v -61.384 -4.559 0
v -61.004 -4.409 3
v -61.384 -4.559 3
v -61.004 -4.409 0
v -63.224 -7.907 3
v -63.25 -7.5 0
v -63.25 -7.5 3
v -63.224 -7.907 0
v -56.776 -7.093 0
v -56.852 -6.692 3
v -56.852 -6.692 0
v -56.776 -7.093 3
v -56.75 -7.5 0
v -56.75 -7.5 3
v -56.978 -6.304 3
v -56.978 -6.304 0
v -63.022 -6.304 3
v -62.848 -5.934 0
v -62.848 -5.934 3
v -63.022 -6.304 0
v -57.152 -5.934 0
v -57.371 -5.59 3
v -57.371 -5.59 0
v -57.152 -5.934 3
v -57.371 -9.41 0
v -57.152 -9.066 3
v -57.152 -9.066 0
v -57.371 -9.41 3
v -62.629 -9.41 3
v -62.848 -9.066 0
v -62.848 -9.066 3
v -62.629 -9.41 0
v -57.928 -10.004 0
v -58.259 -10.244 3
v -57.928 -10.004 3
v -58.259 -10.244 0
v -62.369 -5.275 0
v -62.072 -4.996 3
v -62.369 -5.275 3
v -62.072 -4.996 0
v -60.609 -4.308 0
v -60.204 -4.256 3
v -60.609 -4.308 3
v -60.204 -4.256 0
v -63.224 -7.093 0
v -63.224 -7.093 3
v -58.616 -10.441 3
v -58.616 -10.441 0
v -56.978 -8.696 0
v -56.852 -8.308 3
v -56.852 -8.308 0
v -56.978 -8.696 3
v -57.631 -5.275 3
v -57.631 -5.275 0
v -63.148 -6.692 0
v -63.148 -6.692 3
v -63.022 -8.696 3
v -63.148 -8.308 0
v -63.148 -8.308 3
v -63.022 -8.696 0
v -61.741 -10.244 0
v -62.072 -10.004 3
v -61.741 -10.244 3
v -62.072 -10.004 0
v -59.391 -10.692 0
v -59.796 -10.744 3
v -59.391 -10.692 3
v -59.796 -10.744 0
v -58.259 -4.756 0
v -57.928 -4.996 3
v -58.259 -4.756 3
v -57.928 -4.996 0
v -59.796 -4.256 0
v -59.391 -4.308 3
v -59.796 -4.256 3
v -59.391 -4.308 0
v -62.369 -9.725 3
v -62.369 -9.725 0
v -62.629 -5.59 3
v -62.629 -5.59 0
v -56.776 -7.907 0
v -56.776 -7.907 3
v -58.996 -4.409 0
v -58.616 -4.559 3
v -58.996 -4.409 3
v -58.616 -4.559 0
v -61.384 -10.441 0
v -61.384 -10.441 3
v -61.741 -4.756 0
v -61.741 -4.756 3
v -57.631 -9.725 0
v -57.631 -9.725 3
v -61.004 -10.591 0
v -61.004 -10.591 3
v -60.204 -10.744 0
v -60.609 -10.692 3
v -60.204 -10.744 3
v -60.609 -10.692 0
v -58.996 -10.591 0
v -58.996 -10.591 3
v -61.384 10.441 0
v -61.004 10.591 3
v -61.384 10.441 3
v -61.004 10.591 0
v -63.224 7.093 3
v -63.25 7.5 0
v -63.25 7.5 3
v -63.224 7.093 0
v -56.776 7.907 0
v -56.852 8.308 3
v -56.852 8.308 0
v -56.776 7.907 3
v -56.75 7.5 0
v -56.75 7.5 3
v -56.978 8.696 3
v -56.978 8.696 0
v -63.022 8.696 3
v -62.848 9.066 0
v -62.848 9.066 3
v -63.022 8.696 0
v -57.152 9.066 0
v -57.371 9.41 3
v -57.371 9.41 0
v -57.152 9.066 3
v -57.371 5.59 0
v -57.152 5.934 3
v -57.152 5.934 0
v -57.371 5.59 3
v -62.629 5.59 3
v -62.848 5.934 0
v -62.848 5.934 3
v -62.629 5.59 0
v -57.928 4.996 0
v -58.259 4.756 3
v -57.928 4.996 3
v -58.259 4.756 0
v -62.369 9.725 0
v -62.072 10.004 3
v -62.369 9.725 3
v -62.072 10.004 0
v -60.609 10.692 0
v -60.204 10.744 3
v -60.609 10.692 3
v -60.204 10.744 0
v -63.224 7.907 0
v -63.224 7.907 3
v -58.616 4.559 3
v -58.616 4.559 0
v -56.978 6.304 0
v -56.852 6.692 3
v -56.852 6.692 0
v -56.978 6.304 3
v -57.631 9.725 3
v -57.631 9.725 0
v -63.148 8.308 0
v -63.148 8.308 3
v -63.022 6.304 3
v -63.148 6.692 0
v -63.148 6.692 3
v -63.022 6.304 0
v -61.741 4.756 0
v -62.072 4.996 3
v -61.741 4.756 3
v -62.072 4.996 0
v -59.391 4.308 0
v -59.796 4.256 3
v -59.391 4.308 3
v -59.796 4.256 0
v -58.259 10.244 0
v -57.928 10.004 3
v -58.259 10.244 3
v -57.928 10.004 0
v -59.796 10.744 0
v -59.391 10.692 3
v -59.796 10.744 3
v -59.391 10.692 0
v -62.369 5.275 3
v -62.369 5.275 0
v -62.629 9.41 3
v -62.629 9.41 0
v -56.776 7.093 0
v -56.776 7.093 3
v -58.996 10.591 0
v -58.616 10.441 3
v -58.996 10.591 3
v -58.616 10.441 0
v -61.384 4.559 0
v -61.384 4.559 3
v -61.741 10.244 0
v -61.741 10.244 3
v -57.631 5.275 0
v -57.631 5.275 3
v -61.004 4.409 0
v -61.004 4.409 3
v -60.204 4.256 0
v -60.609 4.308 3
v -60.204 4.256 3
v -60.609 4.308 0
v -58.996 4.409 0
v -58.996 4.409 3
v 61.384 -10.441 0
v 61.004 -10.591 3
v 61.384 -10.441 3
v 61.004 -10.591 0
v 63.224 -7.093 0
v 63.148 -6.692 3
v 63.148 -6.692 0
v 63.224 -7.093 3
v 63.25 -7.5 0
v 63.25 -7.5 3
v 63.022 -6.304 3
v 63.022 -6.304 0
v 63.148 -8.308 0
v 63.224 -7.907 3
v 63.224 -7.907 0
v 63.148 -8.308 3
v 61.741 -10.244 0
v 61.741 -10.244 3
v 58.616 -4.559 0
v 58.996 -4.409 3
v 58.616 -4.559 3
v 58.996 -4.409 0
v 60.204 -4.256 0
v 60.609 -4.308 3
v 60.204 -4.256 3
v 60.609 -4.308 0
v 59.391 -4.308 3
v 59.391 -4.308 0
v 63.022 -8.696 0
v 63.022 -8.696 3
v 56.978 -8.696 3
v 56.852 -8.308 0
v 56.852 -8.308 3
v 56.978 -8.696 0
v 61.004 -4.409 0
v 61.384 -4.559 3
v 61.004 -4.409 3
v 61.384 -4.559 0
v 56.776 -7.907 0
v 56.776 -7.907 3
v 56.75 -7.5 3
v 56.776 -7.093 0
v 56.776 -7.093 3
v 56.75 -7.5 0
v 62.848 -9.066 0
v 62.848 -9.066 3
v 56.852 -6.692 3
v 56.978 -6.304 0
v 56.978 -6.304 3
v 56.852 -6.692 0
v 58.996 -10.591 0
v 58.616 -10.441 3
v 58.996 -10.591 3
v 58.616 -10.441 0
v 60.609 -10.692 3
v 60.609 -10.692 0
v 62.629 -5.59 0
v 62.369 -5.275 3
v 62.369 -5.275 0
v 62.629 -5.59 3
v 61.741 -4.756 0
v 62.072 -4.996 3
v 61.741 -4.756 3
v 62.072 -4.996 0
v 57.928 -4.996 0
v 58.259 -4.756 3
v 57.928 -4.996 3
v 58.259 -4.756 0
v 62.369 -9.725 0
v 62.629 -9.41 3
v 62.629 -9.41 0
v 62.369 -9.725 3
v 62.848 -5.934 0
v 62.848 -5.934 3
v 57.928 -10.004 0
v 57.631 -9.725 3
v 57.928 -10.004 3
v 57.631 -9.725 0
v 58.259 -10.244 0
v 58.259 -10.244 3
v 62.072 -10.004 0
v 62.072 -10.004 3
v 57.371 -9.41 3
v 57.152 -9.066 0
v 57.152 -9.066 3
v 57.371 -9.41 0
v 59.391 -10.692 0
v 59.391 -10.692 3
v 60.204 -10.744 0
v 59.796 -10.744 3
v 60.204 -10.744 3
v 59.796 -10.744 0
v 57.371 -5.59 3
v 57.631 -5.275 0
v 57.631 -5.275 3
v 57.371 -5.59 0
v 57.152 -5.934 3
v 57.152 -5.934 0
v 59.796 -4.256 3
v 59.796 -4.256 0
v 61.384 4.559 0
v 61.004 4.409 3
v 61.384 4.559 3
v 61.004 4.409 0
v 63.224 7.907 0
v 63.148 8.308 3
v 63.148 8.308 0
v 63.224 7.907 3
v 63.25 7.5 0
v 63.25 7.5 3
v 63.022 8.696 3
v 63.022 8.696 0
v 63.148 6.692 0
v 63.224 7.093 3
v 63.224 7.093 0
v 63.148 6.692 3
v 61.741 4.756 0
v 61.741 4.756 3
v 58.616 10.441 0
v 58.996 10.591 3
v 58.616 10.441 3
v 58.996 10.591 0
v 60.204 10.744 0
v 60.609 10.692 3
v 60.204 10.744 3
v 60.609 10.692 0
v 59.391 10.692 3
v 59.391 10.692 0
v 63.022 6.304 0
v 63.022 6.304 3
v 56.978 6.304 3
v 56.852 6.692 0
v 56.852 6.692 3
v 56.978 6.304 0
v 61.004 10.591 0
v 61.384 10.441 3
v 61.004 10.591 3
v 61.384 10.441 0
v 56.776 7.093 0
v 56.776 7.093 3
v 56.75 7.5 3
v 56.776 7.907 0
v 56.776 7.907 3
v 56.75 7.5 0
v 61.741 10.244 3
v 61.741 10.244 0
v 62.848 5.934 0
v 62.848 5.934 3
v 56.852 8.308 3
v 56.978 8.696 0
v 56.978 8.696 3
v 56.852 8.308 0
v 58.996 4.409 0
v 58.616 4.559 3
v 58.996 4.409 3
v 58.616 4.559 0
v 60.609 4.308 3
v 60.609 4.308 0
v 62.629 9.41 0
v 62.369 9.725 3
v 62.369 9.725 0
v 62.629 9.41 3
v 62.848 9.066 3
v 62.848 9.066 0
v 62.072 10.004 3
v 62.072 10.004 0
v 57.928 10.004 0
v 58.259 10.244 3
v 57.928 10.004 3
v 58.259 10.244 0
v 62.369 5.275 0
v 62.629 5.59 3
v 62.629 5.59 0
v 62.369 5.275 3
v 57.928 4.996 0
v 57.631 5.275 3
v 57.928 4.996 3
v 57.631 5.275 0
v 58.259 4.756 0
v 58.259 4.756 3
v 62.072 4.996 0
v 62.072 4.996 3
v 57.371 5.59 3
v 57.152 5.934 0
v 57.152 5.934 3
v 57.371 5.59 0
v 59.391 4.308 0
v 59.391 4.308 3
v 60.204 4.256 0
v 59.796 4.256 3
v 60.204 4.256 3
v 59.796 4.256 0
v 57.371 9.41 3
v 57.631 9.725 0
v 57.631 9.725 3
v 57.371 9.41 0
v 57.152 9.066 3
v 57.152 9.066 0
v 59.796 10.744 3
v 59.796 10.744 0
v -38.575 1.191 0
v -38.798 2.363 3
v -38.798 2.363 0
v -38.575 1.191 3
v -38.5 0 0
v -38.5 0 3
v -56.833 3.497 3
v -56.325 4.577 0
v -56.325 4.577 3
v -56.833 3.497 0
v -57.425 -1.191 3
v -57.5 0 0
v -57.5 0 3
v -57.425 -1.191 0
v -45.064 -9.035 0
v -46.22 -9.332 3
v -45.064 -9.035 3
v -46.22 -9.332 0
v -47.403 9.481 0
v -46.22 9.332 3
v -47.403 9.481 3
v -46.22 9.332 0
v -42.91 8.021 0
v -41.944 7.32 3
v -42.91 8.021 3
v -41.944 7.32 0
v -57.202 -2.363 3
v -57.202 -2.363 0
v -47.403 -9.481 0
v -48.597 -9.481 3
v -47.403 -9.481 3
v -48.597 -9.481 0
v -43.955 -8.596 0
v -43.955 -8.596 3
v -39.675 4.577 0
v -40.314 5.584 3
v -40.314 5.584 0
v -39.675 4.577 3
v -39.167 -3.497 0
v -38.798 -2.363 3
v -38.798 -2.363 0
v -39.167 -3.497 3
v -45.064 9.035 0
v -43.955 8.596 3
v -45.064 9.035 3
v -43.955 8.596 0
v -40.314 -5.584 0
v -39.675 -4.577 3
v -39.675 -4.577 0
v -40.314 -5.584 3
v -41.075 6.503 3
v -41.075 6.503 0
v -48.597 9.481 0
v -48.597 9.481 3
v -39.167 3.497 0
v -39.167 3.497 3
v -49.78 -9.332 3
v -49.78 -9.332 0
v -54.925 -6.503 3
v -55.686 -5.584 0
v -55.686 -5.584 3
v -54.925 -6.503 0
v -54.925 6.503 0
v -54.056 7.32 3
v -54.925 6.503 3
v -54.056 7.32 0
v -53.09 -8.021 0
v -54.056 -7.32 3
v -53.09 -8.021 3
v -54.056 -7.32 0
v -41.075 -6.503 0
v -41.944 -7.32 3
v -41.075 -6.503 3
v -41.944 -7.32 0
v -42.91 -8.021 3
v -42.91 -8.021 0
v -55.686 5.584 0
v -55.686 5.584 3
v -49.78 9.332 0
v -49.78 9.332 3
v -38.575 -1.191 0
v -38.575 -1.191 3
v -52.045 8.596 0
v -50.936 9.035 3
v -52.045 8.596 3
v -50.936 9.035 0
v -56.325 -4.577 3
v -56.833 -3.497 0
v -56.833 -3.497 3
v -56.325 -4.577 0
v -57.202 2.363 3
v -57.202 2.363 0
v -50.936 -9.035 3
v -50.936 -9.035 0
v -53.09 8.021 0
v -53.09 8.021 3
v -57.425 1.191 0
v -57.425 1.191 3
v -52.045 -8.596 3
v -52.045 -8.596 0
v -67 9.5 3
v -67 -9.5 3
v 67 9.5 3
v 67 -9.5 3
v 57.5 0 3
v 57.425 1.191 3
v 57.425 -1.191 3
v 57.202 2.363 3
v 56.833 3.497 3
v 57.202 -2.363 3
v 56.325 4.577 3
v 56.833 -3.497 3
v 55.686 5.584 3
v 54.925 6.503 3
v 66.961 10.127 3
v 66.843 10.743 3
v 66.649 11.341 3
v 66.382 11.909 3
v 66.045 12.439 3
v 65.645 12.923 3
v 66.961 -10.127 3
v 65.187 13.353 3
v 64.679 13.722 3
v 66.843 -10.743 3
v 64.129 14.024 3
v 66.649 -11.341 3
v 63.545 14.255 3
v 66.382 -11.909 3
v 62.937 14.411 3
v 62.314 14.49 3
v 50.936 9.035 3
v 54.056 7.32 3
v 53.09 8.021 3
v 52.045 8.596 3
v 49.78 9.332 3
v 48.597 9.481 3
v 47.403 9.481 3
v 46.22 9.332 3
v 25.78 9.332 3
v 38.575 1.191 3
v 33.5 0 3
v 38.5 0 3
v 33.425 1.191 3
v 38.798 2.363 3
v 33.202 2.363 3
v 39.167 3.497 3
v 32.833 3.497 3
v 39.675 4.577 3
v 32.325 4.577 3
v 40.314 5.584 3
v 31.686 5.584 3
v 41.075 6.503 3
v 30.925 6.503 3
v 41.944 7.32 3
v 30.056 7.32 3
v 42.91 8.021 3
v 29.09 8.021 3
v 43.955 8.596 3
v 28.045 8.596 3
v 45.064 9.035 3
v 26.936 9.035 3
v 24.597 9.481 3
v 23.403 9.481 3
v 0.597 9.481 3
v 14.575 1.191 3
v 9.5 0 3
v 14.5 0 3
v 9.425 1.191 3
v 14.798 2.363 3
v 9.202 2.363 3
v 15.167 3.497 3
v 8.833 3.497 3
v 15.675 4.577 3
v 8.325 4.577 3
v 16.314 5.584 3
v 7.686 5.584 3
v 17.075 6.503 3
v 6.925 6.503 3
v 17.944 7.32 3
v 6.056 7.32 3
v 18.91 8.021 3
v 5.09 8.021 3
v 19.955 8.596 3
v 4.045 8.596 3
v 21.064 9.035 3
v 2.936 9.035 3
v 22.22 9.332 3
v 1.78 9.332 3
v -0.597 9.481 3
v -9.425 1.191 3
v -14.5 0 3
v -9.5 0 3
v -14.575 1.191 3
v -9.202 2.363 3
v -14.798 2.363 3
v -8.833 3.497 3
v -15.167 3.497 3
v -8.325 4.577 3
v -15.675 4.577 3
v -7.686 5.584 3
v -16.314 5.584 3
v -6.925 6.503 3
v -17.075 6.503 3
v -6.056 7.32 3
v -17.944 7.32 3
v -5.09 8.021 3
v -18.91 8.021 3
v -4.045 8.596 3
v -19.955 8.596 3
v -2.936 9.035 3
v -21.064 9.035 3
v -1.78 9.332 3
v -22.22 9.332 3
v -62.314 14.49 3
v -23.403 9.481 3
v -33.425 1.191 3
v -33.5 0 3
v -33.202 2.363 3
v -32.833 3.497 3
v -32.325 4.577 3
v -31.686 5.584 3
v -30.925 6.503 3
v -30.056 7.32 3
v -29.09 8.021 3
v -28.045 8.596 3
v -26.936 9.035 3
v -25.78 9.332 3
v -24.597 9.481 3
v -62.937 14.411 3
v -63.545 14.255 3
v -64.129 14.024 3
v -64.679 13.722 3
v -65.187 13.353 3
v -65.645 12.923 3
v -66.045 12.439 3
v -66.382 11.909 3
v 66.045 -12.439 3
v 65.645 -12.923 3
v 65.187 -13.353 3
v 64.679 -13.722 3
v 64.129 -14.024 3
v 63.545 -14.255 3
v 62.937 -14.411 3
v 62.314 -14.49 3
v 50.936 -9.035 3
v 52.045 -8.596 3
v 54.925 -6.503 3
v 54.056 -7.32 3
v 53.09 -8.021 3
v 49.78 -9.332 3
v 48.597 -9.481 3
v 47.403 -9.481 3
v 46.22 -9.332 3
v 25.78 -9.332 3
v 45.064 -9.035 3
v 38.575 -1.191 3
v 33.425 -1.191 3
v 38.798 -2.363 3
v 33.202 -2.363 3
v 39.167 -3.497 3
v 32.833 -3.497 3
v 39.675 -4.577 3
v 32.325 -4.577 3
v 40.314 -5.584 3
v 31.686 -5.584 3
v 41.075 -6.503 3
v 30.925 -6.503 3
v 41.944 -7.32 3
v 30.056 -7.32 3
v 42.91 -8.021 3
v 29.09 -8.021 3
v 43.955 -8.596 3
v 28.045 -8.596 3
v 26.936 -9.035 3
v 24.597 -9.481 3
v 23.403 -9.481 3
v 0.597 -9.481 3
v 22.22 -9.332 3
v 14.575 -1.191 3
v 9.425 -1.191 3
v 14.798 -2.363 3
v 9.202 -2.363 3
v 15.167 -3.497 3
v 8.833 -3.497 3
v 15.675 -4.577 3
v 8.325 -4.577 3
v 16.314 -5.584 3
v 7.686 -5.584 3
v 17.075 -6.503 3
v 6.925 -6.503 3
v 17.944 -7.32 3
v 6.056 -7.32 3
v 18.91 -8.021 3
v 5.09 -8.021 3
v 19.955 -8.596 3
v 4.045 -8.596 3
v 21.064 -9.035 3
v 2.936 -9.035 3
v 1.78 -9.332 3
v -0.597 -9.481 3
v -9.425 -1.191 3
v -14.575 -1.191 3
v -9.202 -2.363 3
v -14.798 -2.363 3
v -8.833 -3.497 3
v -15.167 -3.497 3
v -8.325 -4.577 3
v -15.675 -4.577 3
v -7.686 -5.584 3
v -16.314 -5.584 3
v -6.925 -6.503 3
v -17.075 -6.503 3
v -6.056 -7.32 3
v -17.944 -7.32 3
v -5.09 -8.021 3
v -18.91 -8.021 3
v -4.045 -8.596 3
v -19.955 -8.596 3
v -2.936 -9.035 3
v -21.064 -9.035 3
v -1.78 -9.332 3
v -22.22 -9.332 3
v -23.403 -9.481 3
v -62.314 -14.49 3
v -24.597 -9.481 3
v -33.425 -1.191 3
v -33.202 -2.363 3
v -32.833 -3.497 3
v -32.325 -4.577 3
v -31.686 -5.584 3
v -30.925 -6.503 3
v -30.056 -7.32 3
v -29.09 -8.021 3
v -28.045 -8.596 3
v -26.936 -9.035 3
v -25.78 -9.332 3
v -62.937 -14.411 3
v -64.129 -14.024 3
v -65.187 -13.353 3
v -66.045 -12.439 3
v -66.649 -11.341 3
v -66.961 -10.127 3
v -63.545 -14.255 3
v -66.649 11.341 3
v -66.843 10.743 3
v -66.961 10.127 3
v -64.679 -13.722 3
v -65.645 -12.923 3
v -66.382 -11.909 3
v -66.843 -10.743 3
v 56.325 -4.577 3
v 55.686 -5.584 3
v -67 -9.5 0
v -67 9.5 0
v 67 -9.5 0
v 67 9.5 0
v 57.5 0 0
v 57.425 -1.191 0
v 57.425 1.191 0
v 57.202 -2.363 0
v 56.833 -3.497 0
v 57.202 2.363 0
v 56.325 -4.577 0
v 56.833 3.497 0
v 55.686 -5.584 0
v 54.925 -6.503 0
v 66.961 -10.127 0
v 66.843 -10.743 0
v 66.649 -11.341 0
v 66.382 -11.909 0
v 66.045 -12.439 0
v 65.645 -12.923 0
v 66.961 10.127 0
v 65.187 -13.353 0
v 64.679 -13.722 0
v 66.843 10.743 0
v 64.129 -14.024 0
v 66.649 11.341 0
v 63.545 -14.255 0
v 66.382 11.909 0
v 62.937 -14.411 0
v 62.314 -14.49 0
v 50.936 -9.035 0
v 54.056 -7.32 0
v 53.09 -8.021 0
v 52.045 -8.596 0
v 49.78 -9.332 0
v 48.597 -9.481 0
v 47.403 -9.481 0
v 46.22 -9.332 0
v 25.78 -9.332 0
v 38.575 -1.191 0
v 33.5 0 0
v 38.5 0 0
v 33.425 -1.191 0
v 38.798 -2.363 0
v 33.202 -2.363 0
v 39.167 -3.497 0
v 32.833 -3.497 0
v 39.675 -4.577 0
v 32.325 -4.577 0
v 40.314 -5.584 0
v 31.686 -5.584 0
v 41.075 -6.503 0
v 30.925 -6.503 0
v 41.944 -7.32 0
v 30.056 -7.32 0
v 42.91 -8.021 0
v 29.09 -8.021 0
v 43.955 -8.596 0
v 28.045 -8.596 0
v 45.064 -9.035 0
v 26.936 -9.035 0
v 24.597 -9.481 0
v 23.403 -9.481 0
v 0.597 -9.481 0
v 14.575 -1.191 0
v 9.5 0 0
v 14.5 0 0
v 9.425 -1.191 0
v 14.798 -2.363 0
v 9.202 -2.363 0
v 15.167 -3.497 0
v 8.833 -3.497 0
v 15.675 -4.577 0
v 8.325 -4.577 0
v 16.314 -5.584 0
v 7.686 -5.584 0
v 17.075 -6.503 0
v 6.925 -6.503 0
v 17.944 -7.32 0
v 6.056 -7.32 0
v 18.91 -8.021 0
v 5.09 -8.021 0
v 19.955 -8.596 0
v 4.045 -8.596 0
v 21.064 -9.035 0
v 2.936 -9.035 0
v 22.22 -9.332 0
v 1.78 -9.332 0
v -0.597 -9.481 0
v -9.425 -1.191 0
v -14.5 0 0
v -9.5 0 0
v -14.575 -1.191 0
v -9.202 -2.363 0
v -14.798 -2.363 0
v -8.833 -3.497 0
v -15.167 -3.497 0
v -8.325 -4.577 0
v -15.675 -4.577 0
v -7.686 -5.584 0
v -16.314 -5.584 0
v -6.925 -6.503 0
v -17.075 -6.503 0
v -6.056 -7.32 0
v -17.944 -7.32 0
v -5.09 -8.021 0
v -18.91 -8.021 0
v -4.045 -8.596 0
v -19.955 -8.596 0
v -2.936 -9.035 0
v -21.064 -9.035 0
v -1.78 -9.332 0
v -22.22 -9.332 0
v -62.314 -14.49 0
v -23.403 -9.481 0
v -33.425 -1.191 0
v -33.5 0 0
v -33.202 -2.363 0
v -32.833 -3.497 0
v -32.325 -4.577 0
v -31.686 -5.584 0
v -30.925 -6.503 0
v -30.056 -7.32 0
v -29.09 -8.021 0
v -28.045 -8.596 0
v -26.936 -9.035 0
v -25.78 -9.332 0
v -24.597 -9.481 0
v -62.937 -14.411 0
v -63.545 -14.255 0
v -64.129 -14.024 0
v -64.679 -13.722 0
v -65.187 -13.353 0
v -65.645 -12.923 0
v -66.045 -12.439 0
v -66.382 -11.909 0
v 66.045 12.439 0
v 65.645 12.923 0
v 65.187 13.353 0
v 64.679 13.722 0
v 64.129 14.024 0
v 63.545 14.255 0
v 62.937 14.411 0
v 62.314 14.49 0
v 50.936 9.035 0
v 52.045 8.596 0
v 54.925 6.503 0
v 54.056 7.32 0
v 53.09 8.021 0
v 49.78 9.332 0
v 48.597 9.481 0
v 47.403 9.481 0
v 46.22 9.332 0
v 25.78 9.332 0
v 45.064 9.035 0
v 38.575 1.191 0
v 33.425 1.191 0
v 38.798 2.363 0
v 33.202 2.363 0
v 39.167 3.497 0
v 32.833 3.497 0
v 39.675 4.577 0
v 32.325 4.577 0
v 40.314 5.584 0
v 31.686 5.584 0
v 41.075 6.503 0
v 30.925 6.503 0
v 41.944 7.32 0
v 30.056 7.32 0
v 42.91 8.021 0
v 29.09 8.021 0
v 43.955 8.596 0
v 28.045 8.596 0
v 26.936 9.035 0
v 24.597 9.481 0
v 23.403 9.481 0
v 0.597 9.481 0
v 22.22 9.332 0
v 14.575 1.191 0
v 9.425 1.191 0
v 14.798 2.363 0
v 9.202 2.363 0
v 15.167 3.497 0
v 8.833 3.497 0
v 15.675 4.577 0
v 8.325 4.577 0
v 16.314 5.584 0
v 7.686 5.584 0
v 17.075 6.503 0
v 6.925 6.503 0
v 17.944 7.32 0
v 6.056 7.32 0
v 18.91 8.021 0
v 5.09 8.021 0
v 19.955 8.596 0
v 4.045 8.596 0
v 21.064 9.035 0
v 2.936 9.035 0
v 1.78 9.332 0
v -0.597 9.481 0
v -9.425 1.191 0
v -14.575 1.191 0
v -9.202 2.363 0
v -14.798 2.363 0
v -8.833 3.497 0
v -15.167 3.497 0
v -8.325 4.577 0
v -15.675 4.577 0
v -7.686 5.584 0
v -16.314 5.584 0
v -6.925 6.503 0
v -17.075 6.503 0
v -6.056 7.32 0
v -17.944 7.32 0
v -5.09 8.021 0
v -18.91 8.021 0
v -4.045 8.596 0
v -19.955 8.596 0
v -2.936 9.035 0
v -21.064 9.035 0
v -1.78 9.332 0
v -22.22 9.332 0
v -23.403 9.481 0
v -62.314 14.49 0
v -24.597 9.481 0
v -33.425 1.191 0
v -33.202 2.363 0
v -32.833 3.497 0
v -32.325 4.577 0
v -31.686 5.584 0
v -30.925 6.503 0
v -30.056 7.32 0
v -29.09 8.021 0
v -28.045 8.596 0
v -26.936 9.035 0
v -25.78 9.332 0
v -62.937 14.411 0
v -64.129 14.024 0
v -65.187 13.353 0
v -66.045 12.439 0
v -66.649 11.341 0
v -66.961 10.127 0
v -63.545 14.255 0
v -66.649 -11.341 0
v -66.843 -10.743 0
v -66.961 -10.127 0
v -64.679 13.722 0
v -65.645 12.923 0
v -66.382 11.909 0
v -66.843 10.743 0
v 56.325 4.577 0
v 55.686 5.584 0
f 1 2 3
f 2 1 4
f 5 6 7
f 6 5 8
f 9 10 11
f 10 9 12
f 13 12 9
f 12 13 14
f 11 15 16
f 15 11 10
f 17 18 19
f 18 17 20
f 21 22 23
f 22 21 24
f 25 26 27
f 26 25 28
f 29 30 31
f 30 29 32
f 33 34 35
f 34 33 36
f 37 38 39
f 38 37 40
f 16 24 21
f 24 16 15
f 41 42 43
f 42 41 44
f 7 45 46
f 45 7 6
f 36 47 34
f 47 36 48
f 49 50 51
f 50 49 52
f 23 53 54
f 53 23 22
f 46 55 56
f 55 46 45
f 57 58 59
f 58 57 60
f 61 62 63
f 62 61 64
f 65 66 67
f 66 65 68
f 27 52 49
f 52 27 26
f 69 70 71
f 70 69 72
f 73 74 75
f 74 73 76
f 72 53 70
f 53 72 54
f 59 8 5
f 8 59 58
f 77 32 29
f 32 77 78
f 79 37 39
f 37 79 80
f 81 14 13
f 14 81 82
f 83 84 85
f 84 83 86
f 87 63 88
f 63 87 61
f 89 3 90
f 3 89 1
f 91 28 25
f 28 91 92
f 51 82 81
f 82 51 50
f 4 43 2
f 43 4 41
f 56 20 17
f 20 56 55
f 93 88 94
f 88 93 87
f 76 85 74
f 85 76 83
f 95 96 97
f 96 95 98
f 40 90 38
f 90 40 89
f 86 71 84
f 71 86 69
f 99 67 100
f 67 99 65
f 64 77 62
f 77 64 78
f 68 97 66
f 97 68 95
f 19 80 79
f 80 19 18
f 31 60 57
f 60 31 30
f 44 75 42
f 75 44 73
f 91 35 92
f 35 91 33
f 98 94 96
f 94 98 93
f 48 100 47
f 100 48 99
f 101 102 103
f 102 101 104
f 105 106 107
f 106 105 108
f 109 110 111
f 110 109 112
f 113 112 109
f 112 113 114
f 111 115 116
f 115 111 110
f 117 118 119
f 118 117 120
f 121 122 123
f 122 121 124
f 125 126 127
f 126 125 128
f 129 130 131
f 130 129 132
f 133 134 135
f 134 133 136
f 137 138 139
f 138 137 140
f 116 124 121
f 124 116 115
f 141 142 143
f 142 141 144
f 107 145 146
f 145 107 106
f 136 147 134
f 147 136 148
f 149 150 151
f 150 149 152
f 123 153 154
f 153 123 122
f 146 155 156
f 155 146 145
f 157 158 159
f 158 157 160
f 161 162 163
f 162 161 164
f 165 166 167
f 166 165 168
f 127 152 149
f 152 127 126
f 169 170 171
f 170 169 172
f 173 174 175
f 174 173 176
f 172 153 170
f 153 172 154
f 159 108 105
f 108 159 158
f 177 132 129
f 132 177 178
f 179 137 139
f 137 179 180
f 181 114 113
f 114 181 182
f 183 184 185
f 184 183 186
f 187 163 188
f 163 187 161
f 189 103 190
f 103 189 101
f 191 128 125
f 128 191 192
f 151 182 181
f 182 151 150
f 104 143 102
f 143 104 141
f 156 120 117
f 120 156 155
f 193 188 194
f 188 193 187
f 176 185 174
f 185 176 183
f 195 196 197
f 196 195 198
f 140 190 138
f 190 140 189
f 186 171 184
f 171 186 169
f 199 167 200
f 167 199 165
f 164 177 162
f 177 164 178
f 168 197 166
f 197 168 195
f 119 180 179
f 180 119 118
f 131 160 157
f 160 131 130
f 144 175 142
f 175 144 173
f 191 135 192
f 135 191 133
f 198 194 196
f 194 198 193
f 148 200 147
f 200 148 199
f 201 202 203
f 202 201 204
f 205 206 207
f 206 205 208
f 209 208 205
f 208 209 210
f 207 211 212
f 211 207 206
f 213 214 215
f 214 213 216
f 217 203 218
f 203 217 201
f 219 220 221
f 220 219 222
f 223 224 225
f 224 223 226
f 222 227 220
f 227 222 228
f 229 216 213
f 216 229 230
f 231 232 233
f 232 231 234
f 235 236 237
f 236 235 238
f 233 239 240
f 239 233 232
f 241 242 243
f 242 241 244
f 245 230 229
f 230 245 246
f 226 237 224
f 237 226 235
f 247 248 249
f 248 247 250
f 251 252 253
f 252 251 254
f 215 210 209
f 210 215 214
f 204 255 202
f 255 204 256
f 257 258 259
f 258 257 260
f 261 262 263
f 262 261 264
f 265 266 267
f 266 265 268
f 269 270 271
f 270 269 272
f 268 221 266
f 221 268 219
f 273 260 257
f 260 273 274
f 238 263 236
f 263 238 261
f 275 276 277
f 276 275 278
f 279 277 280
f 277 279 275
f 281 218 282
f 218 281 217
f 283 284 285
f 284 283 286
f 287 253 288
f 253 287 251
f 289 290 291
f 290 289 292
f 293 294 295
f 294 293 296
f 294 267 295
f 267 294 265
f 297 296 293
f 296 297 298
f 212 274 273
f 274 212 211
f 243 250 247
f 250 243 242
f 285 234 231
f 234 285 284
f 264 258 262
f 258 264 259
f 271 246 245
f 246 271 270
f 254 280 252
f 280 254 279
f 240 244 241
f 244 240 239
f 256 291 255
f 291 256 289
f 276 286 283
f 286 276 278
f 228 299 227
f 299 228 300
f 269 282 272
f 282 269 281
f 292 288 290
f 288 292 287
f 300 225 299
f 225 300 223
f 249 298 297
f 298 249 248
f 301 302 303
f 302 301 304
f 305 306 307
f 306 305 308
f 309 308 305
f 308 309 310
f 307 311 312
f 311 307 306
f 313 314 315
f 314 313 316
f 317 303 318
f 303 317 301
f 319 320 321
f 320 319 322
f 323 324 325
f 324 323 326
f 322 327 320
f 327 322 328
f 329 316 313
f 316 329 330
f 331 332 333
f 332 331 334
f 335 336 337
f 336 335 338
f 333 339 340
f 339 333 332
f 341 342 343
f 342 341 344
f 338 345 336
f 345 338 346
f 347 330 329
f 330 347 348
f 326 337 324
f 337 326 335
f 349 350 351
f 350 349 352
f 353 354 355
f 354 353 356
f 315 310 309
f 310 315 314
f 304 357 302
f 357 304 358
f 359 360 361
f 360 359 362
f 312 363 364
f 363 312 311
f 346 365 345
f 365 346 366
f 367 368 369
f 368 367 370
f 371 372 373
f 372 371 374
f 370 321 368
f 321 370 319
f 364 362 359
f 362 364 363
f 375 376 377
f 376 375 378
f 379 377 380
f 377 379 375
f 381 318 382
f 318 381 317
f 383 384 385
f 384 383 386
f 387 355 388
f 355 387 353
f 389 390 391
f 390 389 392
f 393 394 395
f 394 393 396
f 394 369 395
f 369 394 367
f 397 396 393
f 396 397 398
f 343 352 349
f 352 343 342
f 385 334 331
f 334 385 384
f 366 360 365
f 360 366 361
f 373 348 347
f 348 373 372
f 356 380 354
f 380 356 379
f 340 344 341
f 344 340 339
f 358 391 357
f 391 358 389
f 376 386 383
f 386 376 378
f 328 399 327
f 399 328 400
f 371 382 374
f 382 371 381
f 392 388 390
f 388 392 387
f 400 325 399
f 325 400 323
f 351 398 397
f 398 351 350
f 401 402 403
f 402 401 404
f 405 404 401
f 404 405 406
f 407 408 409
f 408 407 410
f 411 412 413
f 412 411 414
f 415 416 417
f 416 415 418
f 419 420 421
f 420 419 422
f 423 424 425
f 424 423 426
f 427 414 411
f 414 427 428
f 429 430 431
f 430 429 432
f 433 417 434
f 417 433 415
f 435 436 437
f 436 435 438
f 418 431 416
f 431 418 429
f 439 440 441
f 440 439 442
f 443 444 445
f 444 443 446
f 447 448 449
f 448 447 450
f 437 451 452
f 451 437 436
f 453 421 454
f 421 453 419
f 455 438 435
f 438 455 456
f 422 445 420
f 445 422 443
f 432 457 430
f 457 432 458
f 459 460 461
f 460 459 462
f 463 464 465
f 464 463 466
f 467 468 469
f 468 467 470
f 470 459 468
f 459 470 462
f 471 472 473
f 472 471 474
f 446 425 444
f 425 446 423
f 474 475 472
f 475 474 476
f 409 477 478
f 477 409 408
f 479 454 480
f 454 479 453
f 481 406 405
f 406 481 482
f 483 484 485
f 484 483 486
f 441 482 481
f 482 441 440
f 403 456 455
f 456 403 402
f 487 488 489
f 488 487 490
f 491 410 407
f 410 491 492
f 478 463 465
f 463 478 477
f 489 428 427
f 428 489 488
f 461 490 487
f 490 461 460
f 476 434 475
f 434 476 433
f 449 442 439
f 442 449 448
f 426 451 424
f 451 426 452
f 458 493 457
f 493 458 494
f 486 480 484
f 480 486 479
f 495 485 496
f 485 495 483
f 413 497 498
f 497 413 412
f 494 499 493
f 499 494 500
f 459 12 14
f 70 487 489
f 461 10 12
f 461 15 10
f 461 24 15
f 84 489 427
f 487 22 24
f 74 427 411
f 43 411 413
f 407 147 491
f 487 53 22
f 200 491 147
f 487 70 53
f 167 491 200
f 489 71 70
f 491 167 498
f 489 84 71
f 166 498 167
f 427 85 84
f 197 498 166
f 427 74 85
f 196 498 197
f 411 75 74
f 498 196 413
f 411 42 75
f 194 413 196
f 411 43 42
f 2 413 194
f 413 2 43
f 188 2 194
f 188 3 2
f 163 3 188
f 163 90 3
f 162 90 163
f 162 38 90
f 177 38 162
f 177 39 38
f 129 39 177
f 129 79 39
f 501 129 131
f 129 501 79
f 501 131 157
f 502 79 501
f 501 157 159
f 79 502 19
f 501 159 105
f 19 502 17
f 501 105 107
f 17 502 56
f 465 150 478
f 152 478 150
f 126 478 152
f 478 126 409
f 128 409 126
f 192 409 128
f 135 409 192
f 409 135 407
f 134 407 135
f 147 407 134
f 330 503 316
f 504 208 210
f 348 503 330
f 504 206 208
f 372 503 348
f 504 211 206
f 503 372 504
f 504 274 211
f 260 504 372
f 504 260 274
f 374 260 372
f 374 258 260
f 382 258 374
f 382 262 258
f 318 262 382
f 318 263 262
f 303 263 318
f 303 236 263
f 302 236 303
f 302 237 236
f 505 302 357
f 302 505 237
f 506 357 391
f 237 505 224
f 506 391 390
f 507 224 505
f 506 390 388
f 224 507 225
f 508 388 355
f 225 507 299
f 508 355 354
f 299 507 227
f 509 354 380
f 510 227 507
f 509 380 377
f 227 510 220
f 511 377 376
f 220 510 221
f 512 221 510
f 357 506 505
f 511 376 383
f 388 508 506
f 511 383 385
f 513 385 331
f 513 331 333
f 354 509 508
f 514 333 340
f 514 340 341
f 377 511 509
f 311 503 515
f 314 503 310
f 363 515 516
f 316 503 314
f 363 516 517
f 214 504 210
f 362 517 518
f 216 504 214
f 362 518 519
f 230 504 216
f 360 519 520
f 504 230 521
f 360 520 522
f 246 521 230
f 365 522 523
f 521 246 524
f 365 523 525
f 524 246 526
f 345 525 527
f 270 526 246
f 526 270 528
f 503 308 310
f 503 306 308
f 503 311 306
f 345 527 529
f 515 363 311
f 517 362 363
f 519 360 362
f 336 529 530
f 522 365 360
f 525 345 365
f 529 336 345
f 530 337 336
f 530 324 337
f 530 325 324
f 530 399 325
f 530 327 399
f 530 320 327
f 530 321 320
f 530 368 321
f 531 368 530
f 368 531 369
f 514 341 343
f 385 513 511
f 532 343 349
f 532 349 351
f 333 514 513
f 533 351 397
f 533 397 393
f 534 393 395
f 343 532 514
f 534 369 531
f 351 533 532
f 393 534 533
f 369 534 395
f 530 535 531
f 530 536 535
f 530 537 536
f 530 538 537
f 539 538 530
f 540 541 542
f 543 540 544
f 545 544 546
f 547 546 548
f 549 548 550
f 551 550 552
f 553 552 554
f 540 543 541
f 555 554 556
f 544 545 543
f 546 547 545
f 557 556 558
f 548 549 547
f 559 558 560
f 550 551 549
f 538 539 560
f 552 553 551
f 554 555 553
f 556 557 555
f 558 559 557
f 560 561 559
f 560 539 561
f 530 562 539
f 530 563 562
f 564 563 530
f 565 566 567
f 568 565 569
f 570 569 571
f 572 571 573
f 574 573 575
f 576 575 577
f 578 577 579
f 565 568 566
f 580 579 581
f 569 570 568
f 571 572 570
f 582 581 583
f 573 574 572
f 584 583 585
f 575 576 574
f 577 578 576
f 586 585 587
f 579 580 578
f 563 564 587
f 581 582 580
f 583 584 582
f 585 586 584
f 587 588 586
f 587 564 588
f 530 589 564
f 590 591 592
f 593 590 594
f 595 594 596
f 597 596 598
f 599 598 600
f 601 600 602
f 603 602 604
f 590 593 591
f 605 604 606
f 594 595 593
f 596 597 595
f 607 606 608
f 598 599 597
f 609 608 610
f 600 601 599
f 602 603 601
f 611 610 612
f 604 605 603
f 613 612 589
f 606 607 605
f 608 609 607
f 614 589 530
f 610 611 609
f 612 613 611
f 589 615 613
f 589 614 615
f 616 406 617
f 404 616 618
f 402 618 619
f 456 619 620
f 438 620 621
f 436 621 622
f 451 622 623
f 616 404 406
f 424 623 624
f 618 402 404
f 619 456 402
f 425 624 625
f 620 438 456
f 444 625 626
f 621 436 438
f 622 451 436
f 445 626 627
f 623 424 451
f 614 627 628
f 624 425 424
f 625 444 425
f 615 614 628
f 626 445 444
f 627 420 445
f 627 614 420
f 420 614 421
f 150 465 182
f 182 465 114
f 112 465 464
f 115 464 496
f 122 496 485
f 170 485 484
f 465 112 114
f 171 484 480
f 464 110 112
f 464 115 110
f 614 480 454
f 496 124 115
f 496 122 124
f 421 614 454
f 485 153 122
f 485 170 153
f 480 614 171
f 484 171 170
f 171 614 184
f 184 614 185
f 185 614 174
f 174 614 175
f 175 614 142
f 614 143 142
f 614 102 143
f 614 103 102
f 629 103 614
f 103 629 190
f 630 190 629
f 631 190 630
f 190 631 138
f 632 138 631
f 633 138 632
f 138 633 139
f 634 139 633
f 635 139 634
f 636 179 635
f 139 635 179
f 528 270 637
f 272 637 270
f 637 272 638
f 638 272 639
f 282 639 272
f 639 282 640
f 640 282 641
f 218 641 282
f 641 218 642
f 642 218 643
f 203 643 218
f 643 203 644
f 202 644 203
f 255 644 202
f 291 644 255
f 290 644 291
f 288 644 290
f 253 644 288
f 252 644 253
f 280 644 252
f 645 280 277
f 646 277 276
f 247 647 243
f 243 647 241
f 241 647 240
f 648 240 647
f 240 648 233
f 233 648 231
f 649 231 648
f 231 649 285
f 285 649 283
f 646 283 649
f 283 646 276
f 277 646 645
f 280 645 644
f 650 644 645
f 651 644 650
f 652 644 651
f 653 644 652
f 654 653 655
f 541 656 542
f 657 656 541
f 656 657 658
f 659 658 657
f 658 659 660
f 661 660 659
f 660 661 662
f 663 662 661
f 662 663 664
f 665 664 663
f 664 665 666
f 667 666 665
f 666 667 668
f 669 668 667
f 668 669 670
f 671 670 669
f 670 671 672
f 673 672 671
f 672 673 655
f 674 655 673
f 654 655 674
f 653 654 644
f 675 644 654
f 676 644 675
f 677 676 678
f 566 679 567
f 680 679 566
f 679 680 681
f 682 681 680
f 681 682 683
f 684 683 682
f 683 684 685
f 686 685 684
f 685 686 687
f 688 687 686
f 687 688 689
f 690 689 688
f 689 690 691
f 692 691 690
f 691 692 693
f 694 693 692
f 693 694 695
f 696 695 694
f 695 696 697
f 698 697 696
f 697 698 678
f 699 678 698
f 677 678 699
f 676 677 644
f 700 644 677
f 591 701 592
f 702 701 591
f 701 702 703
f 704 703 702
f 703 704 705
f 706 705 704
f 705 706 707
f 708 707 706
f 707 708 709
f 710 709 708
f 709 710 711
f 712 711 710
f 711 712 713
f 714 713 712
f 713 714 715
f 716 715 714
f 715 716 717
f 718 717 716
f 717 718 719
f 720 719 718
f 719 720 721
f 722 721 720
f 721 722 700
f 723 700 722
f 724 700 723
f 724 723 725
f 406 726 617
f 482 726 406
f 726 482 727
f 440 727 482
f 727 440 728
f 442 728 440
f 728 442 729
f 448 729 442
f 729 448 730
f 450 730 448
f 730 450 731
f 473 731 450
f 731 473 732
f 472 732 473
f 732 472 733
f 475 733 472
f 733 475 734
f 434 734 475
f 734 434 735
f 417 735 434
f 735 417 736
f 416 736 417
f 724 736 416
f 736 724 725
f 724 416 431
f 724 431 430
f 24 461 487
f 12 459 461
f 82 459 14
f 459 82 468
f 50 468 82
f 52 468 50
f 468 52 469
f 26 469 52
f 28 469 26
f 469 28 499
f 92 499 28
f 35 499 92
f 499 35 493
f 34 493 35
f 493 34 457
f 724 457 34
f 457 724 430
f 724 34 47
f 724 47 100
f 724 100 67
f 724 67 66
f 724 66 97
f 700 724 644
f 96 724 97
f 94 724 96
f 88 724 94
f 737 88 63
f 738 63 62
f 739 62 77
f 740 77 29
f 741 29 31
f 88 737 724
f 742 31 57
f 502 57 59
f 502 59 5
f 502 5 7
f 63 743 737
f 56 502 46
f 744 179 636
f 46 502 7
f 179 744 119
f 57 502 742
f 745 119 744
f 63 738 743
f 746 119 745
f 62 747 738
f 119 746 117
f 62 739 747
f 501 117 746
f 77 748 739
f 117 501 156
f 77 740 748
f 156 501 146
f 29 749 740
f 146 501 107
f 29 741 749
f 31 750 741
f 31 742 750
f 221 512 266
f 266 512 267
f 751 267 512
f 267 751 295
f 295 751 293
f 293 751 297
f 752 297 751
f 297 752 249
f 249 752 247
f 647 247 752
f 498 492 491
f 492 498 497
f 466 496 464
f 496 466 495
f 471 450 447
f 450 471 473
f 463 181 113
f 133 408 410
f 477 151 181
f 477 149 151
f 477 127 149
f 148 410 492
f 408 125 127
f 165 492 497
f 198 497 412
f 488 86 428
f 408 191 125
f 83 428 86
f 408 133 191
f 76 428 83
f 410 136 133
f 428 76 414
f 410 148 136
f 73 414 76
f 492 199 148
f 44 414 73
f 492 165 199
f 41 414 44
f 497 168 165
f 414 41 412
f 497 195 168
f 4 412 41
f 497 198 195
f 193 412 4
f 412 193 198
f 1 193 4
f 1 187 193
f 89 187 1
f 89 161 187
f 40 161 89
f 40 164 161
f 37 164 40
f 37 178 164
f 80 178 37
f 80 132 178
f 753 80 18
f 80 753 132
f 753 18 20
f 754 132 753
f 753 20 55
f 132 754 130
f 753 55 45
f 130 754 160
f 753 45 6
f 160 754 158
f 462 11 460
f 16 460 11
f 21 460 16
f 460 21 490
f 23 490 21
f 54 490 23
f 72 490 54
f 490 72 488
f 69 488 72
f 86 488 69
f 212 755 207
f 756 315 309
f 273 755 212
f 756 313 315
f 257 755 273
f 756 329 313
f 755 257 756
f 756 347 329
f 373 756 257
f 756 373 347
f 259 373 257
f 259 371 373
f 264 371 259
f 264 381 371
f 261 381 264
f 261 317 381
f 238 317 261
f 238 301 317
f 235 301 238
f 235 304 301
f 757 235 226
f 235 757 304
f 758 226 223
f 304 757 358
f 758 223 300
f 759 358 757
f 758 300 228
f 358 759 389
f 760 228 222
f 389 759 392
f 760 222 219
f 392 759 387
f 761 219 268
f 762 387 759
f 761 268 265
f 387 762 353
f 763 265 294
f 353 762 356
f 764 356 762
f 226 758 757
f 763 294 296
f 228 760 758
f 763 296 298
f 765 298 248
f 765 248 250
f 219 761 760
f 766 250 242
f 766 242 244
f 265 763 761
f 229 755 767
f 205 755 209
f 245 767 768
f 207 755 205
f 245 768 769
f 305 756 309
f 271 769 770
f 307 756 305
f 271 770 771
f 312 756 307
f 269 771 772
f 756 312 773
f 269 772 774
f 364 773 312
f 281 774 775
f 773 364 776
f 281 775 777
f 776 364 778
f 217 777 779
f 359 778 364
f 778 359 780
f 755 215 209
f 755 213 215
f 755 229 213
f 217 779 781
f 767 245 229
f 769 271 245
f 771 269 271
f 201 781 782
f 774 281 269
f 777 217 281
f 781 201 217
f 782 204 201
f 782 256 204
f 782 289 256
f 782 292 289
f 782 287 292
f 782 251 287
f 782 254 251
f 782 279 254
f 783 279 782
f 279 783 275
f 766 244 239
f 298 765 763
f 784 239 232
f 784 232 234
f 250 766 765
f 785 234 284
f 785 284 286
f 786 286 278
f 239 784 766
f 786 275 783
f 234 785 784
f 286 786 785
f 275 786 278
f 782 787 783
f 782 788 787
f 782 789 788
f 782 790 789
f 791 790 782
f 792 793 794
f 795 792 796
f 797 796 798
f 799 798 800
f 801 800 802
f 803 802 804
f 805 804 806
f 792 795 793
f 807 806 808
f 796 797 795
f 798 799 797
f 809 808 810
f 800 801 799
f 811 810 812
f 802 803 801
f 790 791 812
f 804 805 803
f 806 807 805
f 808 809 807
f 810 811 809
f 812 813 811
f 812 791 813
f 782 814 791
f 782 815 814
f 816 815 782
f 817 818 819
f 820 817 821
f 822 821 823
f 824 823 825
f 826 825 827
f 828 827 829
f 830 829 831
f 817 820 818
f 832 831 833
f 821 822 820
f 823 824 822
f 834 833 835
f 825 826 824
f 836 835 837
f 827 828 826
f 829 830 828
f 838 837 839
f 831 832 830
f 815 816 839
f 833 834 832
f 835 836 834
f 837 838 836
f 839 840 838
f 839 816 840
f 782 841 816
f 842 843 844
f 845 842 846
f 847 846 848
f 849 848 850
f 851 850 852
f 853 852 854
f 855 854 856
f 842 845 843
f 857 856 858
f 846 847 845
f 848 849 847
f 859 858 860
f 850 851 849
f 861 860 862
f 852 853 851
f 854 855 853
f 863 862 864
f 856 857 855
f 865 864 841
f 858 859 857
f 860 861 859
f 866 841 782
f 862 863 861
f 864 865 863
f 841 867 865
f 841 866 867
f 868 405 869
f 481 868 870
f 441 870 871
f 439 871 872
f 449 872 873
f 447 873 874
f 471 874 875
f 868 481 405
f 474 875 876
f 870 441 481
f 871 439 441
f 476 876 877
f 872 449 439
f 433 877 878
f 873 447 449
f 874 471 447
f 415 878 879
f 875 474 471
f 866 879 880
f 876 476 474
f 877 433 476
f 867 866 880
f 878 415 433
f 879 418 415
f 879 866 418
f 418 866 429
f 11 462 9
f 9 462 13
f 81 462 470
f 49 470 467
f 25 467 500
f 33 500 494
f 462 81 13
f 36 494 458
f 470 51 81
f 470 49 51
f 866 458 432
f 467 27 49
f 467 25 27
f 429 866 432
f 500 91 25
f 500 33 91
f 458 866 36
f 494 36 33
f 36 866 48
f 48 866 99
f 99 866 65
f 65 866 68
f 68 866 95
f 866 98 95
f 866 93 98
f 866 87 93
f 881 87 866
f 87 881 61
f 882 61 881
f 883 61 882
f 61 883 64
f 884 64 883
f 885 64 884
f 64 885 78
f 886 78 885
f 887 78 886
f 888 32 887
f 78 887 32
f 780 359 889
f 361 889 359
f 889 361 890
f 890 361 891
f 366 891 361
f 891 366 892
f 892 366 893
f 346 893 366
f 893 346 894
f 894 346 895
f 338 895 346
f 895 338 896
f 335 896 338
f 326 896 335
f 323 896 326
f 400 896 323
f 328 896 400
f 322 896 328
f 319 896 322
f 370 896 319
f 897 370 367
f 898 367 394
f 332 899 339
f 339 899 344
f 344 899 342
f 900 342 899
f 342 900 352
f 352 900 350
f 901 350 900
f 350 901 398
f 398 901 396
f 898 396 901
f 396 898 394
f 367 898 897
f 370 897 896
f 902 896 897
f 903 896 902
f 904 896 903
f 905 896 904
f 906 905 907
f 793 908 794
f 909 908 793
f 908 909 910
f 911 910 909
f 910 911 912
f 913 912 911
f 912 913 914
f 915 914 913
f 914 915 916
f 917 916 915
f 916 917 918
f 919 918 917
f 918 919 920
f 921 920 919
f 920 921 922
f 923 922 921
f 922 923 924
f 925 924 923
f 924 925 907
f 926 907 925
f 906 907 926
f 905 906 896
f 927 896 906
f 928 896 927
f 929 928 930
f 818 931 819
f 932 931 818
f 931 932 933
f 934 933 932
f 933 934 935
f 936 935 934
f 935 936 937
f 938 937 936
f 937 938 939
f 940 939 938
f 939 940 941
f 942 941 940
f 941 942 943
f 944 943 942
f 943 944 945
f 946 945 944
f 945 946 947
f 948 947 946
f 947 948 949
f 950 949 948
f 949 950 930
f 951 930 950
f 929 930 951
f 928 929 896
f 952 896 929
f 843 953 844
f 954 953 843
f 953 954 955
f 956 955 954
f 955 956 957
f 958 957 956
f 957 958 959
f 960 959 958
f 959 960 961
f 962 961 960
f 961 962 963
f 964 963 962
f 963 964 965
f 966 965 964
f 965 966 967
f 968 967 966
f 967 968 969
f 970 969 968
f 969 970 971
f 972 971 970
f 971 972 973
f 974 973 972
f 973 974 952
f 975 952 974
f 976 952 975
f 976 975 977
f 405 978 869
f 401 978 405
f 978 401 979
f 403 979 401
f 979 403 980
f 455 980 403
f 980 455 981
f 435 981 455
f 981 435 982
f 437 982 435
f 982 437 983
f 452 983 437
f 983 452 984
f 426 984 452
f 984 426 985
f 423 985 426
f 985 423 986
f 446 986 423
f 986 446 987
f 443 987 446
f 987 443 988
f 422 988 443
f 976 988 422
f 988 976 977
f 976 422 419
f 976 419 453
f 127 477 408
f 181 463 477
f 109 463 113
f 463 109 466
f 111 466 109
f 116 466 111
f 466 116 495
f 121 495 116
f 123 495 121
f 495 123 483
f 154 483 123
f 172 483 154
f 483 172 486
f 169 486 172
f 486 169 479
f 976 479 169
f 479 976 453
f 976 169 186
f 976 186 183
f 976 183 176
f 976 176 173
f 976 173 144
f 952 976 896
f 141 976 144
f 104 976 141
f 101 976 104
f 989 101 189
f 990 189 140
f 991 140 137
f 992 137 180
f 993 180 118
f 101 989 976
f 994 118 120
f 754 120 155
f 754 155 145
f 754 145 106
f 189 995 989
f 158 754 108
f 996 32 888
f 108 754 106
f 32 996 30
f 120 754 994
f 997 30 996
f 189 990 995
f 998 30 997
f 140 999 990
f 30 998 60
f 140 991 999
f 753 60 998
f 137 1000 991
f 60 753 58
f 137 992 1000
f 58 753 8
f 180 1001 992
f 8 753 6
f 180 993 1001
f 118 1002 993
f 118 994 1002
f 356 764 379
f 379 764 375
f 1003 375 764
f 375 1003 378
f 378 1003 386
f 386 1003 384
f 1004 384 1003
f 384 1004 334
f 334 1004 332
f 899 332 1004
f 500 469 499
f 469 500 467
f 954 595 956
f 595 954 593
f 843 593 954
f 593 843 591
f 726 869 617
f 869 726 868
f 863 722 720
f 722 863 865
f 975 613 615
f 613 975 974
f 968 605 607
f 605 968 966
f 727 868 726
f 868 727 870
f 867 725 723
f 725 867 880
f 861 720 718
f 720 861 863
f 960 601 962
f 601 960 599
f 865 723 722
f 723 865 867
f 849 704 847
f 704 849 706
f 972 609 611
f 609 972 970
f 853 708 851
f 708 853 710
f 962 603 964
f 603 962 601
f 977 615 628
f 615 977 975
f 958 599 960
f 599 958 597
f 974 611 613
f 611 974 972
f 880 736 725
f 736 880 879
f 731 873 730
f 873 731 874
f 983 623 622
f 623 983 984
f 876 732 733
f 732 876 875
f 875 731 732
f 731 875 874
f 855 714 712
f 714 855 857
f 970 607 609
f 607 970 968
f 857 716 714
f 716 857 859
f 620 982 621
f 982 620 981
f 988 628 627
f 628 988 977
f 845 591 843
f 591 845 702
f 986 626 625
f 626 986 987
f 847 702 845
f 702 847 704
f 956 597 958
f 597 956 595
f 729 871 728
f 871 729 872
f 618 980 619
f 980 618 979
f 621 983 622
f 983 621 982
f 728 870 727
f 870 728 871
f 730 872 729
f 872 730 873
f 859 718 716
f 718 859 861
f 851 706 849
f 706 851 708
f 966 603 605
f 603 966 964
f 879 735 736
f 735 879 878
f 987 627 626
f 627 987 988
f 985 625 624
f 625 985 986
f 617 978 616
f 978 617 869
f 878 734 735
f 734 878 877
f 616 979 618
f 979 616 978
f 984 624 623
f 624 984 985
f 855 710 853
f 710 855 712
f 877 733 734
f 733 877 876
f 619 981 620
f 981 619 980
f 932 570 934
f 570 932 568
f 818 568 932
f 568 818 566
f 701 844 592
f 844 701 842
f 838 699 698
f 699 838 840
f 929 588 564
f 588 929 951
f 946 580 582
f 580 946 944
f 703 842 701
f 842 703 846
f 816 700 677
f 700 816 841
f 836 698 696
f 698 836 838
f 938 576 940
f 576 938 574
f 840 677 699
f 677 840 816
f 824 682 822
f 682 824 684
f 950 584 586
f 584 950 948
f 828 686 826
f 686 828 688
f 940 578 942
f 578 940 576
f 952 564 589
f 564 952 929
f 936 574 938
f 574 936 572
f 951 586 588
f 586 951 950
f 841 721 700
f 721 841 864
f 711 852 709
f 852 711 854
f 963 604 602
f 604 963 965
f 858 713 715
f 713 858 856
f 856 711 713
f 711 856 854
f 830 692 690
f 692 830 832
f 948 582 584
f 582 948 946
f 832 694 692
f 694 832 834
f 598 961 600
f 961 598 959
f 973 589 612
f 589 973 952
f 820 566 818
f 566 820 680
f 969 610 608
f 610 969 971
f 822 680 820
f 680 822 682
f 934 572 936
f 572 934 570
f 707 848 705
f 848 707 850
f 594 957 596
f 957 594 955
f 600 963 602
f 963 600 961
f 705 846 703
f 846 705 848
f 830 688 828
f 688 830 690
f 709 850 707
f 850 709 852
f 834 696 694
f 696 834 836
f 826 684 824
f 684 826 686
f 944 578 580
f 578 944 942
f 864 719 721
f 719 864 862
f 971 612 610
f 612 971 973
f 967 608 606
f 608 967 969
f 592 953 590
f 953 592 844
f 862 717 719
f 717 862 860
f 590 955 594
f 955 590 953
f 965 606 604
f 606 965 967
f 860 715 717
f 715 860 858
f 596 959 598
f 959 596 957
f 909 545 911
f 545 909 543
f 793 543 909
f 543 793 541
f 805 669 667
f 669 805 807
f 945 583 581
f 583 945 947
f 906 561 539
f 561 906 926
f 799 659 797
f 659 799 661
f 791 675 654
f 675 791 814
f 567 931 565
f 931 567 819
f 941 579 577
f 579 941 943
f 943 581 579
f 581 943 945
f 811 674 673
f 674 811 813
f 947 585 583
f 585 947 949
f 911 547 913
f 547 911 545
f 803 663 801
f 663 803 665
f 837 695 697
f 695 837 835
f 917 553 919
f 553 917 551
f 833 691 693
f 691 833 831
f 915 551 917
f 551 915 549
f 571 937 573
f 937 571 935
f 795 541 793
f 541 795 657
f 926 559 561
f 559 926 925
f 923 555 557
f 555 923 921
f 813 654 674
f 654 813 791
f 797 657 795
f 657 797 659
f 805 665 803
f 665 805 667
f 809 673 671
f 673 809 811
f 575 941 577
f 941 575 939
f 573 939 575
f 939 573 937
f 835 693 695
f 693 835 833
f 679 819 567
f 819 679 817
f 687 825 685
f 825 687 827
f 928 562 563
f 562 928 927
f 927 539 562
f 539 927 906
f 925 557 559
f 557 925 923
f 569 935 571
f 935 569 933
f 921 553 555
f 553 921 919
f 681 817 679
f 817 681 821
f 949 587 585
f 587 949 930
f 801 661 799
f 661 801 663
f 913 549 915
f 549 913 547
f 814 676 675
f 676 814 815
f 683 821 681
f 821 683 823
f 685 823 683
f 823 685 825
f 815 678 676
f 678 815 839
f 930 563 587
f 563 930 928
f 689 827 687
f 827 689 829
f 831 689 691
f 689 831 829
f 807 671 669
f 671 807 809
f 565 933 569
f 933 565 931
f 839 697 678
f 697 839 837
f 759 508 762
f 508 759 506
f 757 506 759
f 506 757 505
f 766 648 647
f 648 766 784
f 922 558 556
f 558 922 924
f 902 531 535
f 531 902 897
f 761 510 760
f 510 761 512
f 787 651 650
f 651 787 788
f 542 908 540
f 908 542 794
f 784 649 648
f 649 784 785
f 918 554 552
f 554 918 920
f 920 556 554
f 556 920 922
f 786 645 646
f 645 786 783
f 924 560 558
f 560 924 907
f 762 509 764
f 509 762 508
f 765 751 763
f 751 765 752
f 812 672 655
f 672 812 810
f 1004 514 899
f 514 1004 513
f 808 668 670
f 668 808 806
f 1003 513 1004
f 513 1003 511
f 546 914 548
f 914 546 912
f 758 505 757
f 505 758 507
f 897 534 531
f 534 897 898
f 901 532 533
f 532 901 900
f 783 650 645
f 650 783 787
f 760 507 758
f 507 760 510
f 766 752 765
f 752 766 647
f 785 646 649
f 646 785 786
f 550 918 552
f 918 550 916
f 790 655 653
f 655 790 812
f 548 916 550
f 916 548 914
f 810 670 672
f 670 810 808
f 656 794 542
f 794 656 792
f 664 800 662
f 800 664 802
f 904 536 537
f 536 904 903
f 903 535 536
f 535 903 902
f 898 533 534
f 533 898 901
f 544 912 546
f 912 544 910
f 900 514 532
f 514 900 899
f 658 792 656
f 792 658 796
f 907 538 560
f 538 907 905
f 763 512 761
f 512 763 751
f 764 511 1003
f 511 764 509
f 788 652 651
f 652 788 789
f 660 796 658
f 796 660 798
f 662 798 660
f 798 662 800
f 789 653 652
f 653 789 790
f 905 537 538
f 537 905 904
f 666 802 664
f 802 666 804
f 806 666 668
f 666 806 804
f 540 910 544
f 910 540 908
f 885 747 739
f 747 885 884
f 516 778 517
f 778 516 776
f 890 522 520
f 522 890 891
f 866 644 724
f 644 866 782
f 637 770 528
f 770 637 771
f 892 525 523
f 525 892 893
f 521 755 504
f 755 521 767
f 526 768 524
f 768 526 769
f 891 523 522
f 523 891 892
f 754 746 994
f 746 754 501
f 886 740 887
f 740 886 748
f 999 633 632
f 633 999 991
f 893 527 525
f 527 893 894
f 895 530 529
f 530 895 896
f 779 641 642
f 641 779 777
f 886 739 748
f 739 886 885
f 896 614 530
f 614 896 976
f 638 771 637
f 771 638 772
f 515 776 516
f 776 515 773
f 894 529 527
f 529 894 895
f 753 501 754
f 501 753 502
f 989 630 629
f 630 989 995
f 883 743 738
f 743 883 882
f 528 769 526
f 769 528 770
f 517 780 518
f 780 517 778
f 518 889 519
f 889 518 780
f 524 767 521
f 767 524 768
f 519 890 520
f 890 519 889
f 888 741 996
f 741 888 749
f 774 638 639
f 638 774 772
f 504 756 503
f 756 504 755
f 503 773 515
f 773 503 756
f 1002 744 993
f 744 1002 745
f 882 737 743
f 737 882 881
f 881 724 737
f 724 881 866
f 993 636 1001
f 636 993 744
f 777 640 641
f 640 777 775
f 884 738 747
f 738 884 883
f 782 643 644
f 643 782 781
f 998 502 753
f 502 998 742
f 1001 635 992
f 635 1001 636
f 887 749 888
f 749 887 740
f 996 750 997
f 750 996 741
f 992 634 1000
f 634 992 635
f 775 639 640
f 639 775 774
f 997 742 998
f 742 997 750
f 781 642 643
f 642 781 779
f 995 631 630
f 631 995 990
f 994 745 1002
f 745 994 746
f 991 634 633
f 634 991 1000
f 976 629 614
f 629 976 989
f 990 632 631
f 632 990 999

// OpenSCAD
$fn = 50;


difference() {
	union() {
		hull() {
			translate(v = [-62.0000000000, 9.5000000000, 0]) {
				cylinder(h = 3, r = 5);
			}
			translate(v = [62.0000000000, 9.5000000000, 0]) {
				cylinder(h = 3, r = 5);
			}
			translate(v = [-62.0000000000, -9.5000000000, 0]) {
				cylinder(h = 3, r = 5);
			}
			translate(v = [62.0000000000, -9.5000000000, 0]) {
				cylinder(h = 3, r = 5);
			}
		}
	}
	union() {
		#translate(v = [-60.0000000000, -7.5000000000, -100.0000000000]) {
			cylinder(h = 200, r = 3.2500000000);
		}
		#translate(v = [-60.0000000000, 7.5000000000, -100.0000000000]) {
			cylinder(h = 200, r = 3.2500000000);
		}
		#translate(v = [60.0000000000, -7.5000000000, -100.0000000000]) {
			cylinder(h = 200, r = 3.2500000000);
		}
		#translate(v = [60.0000000000, 7.5000000000, -100.0000000000]) {
			cylinder(h = 200, r = 3.2500000000);
		}
		#translate(v = [-48.0000000000, 0, 0]) {
			cylinder(h = 3, r = 9.5000000000);
		}
		#translate(v = [-24.0000000000, 0, 0]) {
			cylinder(h = 3, r = 9.5000000000);
		}
		#cylinder(h = 3, r = 9.5000000000);
		#translate(v = [24.0000000000, 0, 0]) {
			cylinder(h = 3, r = 9.5000000000);
		}
		#translate(v = [48.0000000000, 0, 0]) {
			cylinder(h = 3, r = 9.5000000000);
		}
	}
}
